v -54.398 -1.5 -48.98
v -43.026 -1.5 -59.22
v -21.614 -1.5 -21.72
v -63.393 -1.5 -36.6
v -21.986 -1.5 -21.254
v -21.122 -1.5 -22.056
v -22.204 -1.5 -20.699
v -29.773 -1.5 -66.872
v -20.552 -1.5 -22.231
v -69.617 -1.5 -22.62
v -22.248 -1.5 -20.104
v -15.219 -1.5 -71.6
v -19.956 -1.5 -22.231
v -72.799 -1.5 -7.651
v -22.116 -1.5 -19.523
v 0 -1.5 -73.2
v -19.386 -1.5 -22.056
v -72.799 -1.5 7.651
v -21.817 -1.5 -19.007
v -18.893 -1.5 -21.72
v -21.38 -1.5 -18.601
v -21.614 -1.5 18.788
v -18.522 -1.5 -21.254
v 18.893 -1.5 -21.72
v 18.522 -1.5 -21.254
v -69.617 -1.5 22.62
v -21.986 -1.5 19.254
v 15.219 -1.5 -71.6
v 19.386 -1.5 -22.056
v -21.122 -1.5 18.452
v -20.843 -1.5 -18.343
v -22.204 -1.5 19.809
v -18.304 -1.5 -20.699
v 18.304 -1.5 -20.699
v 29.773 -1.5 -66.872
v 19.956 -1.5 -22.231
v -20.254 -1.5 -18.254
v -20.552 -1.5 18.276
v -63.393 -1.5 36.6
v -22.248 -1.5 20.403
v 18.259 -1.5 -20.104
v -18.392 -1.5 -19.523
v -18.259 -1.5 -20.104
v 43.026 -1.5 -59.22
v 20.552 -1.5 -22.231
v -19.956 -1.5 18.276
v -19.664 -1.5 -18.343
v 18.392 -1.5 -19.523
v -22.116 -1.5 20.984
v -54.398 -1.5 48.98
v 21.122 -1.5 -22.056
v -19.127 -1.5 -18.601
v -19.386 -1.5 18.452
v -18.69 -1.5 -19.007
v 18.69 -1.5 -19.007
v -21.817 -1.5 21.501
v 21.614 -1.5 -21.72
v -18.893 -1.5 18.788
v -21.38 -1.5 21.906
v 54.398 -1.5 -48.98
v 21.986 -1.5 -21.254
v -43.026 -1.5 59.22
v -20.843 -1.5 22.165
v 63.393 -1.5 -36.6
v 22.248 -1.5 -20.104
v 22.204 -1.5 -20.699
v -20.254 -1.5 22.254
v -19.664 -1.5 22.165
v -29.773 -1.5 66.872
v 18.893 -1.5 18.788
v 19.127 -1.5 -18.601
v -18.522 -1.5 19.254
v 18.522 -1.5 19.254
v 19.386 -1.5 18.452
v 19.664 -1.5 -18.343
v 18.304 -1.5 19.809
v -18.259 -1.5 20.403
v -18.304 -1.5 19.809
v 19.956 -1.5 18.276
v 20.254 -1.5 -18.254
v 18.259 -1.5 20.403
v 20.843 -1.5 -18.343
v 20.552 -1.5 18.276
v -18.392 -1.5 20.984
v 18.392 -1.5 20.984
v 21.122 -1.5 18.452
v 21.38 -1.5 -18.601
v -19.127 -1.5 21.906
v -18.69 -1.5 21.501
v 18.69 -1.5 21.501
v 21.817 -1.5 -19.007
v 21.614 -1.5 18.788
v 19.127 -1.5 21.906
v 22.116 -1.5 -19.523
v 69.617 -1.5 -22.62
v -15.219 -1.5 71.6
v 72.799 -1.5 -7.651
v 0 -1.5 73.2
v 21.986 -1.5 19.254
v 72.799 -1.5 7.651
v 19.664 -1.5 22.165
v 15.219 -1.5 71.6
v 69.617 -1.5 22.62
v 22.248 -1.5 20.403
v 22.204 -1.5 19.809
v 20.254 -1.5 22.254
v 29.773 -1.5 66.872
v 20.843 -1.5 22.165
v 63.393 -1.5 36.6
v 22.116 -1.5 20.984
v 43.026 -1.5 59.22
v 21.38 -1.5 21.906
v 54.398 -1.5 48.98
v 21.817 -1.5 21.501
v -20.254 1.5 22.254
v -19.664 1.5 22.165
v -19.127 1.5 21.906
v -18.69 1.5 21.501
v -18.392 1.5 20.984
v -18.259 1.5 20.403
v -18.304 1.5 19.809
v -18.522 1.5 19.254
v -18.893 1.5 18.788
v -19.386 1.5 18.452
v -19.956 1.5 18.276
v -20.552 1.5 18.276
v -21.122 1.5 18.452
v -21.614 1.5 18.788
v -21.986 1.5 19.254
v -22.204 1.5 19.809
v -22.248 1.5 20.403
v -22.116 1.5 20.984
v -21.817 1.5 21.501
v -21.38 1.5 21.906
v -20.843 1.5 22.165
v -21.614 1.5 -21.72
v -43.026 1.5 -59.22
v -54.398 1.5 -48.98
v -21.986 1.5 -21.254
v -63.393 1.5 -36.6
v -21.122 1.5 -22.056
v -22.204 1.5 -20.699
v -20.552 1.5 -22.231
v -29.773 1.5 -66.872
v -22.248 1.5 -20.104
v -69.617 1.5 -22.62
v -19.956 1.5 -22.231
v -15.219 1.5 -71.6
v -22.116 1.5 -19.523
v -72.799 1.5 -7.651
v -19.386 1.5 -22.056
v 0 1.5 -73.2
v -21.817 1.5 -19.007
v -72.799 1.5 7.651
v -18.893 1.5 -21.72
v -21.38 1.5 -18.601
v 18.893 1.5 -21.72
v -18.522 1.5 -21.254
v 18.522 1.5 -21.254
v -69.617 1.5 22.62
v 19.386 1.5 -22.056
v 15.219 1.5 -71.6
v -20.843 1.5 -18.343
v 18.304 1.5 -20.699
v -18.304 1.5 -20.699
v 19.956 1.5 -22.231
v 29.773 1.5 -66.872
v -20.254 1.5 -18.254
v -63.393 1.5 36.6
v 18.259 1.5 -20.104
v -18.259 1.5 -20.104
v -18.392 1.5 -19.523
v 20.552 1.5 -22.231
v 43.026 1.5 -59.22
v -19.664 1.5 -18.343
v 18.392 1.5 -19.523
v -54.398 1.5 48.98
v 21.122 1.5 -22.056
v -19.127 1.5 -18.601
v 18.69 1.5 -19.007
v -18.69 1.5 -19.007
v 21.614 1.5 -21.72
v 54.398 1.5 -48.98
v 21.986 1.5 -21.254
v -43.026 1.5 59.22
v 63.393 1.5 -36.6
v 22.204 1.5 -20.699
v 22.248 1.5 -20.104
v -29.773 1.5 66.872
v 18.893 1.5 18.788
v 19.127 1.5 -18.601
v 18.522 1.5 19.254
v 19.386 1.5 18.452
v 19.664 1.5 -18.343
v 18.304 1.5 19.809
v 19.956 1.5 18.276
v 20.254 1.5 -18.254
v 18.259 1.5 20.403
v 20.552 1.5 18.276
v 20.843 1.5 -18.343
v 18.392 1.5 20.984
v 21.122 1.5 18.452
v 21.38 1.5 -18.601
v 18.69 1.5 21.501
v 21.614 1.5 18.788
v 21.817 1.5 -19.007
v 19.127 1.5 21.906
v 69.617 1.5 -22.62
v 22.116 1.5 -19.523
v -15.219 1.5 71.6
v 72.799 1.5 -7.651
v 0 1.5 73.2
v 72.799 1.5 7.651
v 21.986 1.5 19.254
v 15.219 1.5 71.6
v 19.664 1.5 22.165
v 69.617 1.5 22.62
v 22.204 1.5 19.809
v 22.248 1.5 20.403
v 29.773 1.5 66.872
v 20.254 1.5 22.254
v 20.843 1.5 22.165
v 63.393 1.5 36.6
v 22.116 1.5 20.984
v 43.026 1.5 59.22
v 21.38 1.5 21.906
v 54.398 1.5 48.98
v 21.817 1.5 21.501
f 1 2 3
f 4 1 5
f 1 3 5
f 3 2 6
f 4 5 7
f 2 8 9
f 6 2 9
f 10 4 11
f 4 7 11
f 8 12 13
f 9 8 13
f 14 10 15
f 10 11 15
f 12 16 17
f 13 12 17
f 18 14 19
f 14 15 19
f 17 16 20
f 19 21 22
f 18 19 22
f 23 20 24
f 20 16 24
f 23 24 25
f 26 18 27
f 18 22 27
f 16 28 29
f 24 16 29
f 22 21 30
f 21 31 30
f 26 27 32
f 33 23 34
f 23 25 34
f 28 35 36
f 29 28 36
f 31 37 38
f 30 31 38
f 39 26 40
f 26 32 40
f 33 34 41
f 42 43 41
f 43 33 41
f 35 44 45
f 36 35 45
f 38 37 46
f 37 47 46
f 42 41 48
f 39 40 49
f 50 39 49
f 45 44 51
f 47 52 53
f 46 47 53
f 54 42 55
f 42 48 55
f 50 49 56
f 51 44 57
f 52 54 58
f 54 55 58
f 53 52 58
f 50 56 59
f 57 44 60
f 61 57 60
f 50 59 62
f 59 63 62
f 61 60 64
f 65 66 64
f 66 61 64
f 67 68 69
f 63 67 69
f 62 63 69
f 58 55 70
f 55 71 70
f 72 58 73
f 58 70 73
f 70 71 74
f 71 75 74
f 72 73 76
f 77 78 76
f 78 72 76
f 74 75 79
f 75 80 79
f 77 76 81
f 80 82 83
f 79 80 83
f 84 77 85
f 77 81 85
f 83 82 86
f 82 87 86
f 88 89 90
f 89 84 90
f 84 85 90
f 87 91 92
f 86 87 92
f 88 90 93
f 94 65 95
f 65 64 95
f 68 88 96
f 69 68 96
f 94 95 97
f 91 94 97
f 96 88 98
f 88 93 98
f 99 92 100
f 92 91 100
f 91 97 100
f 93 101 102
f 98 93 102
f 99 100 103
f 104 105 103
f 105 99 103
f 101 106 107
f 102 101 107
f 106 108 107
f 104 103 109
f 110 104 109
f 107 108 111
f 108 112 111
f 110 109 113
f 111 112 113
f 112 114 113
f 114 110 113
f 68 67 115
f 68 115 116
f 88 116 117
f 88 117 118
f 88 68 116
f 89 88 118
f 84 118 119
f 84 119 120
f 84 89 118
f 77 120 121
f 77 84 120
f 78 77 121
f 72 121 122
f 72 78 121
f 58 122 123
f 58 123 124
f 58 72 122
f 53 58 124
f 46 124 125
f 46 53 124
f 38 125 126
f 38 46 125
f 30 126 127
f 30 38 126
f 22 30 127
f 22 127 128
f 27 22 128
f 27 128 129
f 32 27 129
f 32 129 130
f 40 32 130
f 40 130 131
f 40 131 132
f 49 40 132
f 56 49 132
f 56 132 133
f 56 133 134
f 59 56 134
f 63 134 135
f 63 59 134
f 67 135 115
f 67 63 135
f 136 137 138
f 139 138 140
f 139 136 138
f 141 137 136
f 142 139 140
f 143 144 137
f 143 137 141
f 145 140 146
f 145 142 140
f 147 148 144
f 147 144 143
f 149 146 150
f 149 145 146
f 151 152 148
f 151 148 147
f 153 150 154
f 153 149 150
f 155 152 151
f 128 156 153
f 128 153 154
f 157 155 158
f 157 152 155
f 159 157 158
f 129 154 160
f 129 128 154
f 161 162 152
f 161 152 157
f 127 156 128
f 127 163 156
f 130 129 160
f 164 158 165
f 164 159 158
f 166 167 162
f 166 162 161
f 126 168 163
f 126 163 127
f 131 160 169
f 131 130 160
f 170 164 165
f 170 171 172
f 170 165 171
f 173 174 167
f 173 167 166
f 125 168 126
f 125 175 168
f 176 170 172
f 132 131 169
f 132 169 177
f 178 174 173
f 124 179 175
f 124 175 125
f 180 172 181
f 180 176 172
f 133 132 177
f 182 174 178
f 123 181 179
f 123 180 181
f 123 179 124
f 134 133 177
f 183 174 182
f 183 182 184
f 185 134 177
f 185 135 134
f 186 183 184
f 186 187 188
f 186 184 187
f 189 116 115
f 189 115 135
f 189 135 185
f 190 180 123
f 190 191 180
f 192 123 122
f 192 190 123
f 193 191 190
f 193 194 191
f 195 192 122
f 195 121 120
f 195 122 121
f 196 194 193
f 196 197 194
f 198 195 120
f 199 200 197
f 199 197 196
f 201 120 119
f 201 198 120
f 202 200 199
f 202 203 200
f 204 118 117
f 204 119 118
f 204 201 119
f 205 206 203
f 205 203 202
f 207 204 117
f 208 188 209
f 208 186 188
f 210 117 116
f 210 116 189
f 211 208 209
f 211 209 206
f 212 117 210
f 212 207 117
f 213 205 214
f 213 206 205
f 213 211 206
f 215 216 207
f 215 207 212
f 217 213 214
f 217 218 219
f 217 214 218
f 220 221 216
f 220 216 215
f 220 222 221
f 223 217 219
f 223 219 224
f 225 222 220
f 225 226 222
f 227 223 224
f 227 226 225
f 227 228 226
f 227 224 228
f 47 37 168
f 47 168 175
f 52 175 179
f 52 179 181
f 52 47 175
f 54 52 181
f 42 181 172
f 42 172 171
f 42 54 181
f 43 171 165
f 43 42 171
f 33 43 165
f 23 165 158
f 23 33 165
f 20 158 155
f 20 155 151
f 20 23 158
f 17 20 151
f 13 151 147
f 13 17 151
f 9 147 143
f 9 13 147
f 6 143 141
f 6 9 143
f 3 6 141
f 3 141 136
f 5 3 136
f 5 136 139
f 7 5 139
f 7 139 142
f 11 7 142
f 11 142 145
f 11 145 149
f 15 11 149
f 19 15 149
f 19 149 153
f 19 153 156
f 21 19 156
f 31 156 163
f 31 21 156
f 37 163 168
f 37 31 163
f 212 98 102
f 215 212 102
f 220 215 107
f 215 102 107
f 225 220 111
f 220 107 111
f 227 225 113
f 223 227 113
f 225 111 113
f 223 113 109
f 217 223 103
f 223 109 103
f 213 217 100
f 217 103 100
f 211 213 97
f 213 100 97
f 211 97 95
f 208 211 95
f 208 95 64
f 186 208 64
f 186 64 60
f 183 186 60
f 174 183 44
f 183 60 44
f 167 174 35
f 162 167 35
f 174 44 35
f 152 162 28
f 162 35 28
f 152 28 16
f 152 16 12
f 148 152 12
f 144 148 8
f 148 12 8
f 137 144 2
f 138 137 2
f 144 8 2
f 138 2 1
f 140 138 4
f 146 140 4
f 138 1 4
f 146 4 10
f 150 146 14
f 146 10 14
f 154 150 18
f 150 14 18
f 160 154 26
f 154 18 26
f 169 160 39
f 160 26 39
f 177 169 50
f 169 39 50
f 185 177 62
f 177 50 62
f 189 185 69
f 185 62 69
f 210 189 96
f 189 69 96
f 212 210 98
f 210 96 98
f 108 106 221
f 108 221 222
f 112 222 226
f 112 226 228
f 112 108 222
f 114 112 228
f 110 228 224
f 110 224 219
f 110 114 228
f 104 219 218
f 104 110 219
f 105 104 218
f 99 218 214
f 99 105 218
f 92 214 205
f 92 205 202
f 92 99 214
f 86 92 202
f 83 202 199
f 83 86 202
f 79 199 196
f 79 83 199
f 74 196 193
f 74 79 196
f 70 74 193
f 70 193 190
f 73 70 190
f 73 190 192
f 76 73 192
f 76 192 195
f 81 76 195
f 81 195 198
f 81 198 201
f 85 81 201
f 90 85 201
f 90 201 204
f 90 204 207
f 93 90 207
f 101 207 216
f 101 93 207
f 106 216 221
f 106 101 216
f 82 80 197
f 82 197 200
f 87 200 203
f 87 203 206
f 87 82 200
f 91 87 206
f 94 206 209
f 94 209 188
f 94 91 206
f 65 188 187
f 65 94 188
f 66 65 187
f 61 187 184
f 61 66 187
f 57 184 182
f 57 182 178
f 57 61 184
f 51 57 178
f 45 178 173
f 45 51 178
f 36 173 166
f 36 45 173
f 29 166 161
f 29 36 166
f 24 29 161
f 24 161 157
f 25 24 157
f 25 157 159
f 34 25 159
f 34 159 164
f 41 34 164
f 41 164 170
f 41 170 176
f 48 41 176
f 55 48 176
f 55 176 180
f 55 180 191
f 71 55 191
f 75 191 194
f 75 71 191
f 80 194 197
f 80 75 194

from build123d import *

# Parameters (mm, degrees)
BOSS_EXTRUDE1_DEPTH      = 1.5
BOSS_EXTRUDE1_DEPTH_BACK = 1.5
SKETCH1_R                = 73.2
SKETCH1_R_2              = 2


with BuildPart() as part:
    # Sketch1 → Boss-Extrude1 (new, two sides: drawn at the far end of the back side and taken through both)
    with BuildSketch(Plane(origin=(0, 0, 0), x_dir=(1, 0, 0), z_dir=(0, 1, 0)).offset(-BOSS_EXTRUDE1_DEPTH_BACK)):
        Circle(SKETCH1_R)
        with Locations((20.253785579, 20.253785579)):
            Circle(SKETCH1_R_2, mode=Mode.SUBTRACT)
        with Locations((20.253785579, -20.253785579)):
            Circle(SKETCH1_R_2, mode=Mode.SUBTRACT)
        with Locations((-20.253785579, -20.253785579)):
            Circle(SKETCH1_R_2, mode=Mode.SUBTRACT)
        with Locations((-20.253785579, 20.253785579)):
            Circle(SKETCH1_R_2, mode=Mode.SUBTRACT)
    extrude(amount=BOSS_EXTRUDE1_DEPTH + BOSS_EXTRUDE1_DEPTH_BACK)


solid = part.part
